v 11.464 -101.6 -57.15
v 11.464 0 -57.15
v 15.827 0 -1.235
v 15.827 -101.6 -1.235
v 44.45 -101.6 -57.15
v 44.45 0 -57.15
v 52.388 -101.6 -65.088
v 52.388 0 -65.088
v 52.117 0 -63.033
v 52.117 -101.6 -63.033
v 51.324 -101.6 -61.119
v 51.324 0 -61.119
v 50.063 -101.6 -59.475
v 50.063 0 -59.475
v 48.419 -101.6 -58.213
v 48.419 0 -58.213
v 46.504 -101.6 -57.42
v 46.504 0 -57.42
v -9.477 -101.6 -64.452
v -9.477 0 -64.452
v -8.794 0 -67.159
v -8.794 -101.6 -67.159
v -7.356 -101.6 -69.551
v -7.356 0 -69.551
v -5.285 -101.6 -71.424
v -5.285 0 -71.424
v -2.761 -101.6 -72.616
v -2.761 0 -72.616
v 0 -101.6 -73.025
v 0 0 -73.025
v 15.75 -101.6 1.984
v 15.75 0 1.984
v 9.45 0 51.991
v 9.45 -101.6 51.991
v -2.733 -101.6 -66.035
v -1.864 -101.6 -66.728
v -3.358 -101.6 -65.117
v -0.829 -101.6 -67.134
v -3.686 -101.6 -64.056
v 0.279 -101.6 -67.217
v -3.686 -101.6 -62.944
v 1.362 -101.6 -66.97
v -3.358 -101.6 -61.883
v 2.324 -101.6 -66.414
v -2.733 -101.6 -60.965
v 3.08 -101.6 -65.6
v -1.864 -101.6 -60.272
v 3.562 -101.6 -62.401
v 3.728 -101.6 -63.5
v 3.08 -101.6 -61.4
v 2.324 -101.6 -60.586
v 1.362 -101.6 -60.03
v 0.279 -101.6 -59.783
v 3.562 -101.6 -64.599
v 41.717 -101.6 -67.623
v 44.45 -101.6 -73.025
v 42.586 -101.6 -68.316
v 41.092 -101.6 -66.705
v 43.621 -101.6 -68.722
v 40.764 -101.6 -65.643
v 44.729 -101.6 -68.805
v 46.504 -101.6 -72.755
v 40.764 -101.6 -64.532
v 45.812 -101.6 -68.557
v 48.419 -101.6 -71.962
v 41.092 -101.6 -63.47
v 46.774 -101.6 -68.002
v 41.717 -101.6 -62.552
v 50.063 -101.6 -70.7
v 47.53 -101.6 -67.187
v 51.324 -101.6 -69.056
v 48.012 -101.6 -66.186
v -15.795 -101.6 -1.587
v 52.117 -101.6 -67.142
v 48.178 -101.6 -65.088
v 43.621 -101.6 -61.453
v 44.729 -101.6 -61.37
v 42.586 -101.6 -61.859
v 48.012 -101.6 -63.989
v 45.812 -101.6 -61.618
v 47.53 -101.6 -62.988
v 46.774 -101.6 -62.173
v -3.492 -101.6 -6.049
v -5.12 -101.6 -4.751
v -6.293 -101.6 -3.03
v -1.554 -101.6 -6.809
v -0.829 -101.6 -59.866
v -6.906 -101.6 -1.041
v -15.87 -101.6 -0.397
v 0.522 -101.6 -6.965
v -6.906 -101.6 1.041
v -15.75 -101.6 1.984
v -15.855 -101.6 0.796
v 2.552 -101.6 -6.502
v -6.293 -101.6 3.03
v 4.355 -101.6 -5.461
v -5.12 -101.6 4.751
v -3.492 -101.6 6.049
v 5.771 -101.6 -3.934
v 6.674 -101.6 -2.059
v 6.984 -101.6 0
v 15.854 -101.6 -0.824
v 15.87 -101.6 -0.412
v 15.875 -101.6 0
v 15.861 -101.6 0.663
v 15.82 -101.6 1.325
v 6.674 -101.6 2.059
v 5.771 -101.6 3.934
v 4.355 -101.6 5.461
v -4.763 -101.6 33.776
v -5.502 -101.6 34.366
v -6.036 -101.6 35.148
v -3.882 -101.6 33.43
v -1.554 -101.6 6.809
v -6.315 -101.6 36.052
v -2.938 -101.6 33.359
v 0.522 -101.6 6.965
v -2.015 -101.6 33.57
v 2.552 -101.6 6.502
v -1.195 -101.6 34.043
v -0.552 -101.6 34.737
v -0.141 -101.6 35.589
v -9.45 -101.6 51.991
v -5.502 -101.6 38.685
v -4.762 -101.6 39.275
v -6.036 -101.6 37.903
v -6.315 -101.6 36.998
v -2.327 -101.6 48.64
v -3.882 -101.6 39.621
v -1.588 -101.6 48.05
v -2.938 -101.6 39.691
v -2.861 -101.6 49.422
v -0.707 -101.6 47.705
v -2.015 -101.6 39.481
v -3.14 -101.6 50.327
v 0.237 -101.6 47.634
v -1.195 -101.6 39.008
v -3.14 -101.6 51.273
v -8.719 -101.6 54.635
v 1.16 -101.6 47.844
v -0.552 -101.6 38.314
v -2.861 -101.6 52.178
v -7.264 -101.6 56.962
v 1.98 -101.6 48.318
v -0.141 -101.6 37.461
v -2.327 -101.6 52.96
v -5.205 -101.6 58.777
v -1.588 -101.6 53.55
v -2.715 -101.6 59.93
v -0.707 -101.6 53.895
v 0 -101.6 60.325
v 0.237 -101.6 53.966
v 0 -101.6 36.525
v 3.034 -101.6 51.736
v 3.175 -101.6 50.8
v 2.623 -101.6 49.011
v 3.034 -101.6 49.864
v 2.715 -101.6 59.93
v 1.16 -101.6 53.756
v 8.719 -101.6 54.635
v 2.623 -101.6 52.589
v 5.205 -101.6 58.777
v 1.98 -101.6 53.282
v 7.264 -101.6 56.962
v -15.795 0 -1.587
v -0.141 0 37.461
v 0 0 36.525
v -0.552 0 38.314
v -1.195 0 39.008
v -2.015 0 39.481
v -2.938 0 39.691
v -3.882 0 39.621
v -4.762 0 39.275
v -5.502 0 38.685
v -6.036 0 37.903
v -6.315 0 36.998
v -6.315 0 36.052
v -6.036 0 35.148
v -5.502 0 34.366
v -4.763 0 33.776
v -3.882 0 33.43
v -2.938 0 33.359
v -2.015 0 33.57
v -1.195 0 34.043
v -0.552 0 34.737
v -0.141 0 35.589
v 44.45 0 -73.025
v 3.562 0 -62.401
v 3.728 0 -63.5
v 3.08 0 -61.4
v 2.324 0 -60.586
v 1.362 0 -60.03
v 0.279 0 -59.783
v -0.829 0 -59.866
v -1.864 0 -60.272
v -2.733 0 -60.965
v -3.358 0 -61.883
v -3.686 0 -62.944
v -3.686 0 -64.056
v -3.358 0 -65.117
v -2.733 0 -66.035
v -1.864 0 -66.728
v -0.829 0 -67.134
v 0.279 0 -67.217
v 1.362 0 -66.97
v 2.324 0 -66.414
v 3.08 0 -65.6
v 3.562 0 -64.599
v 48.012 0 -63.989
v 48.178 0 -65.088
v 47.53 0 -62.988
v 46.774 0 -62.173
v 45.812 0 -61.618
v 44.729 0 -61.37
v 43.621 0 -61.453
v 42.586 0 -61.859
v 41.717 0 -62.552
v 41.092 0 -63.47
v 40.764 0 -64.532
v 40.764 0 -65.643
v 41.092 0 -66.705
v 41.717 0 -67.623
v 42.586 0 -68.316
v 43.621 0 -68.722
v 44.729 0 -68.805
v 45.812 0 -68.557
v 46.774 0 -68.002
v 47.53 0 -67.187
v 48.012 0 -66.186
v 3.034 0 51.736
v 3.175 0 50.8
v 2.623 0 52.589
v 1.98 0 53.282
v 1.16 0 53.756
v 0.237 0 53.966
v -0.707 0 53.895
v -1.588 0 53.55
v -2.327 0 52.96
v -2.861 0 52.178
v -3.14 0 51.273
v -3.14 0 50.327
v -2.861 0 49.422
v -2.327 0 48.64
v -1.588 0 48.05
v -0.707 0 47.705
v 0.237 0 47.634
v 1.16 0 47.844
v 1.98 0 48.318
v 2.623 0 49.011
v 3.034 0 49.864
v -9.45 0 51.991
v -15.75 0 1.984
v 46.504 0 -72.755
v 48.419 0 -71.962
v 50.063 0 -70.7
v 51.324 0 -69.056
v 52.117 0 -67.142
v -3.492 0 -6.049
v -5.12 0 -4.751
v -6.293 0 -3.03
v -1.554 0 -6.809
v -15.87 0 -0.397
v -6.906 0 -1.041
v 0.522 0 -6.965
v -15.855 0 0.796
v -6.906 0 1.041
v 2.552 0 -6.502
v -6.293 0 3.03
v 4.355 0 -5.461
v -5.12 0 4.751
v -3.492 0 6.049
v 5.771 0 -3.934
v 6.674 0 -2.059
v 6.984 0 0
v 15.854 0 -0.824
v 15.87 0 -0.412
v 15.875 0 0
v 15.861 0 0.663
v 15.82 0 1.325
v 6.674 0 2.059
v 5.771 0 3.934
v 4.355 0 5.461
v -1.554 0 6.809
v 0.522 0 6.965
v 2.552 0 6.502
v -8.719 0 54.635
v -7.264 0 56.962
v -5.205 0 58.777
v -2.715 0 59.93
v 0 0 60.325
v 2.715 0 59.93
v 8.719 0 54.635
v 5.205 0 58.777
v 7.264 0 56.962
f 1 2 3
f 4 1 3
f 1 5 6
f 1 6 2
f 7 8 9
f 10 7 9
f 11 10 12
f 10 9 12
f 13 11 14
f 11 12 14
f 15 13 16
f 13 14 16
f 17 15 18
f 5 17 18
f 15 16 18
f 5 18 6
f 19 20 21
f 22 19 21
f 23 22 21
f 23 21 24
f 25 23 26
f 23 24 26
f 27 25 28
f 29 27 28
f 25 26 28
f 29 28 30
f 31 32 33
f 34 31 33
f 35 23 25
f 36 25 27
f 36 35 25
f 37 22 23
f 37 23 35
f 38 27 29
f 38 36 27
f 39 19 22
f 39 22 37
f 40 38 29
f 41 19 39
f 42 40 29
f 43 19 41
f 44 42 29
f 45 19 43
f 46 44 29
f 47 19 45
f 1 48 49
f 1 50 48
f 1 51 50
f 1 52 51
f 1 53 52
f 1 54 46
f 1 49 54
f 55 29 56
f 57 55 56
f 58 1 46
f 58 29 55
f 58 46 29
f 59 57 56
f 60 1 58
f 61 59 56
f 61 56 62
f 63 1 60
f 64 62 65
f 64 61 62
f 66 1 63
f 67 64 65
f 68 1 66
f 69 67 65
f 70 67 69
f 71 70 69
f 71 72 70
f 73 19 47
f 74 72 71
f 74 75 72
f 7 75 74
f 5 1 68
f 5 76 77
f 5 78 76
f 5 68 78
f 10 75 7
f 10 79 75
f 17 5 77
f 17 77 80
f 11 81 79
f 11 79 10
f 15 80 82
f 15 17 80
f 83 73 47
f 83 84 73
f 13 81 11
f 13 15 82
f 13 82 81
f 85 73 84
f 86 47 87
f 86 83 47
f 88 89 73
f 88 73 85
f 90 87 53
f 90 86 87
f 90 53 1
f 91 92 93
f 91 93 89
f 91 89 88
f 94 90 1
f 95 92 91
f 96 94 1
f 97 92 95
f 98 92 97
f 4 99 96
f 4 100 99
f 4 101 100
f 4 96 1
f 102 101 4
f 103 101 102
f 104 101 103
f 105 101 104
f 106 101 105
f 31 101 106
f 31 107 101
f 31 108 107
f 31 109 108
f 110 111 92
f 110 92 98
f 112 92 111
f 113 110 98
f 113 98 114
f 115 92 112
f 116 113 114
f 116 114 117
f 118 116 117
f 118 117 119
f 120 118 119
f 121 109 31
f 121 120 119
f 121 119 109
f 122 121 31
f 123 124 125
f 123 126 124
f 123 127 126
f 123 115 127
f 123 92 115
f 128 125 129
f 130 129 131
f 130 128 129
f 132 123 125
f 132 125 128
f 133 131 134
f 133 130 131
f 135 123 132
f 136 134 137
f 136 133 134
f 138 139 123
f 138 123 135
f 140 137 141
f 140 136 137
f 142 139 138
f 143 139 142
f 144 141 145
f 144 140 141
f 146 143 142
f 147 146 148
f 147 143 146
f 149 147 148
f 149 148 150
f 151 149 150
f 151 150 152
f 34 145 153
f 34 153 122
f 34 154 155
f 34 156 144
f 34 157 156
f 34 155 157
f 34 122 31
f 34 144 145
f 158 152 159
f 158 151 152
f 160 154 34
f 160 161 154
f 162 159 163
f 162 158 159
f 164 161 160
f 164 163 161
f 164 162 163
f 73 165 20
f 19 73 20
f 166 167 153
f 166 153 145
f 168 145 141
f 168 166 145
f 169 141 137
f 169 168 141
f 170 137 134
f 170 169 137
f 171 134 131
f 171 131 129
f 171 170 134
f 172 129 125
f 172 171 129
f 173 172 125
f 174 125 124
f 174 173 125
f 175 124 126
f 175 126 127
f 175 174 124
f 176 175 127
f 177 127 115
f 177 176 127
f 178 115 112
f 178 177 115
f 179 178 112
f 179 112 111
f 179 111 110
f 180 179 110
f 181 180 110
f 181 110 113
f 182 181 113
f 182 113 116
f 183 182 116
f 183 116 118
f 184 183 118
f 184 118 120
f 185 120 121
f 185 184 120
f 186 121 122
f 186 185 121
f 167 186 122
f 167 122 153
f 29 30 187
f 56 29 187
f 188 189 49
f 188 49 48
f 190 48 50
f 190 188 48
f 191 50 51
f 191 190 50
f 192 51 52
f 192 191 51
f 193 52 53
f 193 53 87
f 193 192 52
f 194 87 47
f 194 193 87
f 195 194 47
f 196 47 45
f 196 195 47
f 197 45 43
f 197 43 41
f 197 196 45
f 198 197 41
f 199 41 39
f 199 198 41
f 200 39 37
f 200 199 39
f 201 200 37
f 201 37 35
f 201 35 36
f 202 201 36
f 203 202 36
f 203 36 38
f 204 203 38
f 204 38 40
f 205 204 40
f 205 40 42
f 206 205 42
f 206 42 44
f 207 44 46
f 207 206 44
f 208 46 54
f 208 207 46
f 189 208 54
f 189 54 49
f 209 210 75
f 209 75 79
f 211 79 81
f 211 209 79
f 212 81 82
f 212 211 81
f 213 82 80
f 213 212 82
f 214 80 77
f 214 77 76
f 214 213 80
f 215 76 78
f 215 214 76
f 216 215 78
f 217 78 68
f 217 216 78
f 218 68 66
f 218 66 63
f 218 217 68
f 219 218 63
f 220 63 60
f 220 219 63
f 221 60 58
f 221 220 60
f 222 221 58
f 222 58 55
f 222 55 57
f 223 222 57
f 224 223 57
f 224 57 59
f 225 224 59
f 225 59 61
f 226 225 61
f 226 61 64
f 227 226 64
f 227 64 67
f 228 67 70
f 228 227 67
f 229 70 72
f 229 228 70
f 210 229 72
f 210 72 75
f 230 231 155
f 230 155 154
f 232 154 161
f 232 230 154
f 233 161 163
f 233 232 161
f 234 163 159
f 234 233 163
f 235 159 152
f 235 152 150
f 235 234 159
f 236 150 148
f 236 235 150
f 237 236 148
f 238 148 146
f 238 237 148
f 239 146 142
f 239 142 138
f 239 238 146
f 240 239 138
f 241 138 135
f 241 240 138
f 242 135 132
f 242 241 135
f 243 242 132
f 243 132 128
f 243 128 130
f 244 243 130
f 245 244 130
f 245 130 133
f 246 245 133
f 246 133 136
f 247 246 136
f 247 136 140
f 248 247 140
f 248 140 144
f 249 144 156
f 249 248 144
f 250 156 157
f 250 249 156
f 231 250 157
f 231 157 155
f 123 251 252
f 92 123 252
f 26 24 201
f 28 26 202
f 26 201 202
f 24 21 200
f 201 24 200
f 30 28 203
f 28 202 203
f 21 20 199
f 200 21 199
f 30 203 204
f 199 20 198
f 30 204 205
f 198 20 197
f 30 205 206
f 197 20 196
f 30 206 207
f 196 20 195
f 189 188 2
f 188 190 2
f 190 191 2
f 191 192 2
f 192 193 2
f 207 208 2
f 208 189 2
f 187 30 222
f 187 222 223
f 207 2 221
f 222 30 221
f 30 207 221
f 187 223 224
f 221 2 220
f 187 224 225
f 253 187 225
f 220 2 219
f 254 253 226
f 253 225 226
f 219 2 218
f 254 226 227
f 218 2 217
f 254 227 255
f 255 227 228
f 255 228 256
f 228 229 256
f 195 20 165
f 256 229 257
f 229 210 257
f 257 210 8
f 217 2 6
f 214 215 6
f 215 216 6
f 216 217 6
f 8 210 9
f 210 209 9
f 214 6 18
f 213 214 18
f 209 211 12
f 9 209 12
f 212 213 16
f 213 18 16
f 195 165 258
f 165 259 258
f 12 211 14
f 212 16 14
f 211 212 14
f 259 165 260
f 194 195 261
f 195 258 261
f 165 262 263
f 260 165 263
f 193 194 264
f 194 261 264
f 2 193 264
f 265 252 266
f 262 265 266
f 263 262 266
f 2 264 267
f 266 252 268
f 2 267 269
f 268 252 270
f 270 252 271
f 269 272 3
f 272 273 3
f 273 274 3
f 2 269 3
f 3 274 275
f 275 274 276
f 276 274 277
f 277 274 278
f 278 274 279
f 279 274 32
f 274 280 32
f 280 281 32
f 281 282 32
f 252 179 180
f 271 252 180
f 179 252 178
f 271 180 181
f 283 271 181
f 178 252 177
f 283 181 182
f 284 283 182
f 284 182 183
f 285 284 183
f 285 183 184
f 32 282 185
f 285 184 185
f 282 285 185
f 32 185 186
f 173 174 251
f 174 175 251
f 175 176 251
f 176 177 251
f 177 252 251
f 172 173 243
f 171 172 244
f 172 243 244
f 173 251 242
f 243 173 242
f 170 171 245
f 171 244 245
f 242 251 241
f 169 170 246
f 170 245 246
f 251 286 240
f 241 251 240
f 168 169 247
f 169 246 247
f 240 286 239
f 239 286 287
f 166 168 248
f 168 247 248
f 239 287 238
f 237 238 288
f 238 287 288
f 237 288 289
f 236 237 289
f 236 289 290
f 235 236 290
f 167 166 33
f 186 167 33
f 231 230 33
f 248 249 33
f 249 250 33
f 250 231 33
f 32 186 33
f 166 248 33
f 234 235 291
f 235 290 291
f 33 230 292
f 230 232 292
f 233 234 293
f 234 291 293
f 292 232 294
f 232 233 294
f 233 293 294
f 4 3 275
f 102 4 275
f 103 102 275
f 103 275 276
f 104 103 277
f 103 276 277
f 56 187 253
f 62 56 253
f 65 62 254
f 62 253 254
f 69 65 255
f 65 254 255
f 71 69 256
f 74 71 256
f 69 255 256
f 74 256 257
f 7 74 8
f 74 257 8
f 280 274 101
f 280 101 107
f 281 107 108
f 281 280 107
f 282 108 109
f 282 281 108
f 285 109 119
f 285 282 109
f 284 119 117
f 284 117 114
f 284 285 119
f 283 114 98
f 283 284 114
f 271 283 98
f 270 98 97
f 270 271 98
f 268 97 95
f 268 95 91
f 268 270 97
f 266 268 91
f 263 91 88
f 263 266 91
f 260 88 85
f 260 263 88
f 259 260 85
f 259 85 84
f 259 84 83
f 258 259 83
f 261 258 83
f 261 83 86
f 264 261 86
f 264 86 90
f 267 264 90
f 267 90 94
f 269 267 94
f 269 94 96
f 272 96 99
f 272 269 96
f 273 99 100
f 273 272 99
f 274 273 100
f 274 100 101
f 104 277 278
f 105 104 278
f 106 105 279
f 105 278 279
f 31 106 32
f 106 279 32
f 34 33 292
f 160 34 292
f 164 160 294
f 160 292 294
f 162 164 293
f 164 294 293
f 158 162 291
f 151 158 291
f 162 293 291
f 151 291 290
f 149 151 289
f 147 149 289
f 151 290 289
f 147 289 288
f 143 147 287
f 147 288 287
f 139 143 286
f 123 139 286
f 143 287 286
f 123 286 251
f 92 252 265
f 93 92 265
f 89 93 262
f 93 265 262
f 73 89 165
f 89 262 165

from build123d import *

# Parameters (mm, degrees)
F0_R     = 6.984327
F0_R_2   = 3.175
F0_R_3   = 3.727636
F1_DEPTH = 101.6


with BuildPart() as f1:
    # F0 (on Front) → F1 (new body)
    with BuildSketch(Plane.XZ):
        with BuildLine():
            ThreePointArc((15.826897, -1.234892), (15.86297, -0.617914), (15.875, 0))
            ThreePointArc((15.875, 0), (15.843841, 0.994139), (15.750488, 1.984375))
            ThreePointArc((15.750488, 1.984375), (0, 15.875), (-15.750488, 1.984375))
            ThreePointArc((-15.750488, 1.984375), (-15.873744, 0.199705), (-15.795426, -1.5875))
            ThreePointArc((-15.795426, -1.5875), (0.177005, -15.874013), (15.826897, -1.234892))
        make_face()
        Circle(F0_R, mode=Mode.SUBTRACT)
        with BuildLine():
            ThreePointArc((-15.750488, 1.984375), (0, 15.875), (15.750488, 1.984375))
            Line((15.750488, 1.984375), (9.450293, 51.990625))
            ThreePointArc((9.450293, 51.990625), (9.506305, 51.396483), (9.525, 50.8))
            ThreePointArc((9.525, 50.8), (-0.596483, 41.293695), (-9.450293, 51.990625))
            Line((-9.450293, 51.990625), (-15.750488, 1.984375))
        make_face()
        with Locations((-3.175, 36.5252)):
            Circle(F0_R_2, mode=Mode.SUBTRACT)
        with BuildLine():
            Line((11.464128, -57.15), (15.826897, -1.234892))
            ThreePointArc((15.826897, -1.234892), (0.177005, -15.874013), (-15.795426, -1.5875))
            Line((-15.795426, -1.5875), (-9.477255, -64.4525))
            ThreePointArc((-9.477255, -64.4525), (-0.476848, -53.986944), (9.525, -63.5))
            ThreePointArc((9.525, -63.5), (6.735192, -70.235192), (0, -73.025))
            Line((0, -73.025), (44.45, -73.025))
            ThreePointArc((44.45, -73.025), (36.5125, -65.0875), (44.45, -57.15))
            Line((44.45, -57.15), (11.464128, -57.15))
        make_face()
        with BuildLine():
            ThreePointArc((9.525, 50.8), (9.506305, 51.396483), (9.450293, 51.990625))
            ThreePointArc((9.450293, 51.990625), (0, 60.325), (-9.450293, 51.990625))
            ThreePointArc((-9.450293, 51.990625), (-0.596483, 41.293695), (9.525, 50.8))
        make_face()
        with Locations((0, 50.8)):
            Circle(F0_R_2, mode=Mode.SUBTRACT)
        with BuildLine():
            ThreePointArc((9.525, -63.5), (-0.476848, -53.986944), (-9.477255, -64.4525))
            ThreePointArc((-9.477255, -64.4525), (-6.389564, -70.563929), (0, -73.025))
            ThreePointArc((0, -73.025), (6.735192, -70.235192), (9.525, -63.5))
        make_face()
        with Locations((0, -63.5)):
            Circle(F0_R_3, mode=Mode.SUBTRACT)
        with BuildLine():
            ThreePointArc((52.3875, -65.0875), (50.06266, -59.47484), (44.45, -57.15))
            ThreePointArc((44.45, -57.15), (36.5125, -65.0875), (44.45, -73.025))
            ThreePointArc((44.45, -73.025), (50.06266, -70.70016), (52.3875, -65.0875))
        make_face()
        with Locations((44.45, -65.0875)):
            Circle(F0_R_3, mode=Mode.SUBTRACT)
    extrude(amount=F1_DEPTH)


solid = f1.part
